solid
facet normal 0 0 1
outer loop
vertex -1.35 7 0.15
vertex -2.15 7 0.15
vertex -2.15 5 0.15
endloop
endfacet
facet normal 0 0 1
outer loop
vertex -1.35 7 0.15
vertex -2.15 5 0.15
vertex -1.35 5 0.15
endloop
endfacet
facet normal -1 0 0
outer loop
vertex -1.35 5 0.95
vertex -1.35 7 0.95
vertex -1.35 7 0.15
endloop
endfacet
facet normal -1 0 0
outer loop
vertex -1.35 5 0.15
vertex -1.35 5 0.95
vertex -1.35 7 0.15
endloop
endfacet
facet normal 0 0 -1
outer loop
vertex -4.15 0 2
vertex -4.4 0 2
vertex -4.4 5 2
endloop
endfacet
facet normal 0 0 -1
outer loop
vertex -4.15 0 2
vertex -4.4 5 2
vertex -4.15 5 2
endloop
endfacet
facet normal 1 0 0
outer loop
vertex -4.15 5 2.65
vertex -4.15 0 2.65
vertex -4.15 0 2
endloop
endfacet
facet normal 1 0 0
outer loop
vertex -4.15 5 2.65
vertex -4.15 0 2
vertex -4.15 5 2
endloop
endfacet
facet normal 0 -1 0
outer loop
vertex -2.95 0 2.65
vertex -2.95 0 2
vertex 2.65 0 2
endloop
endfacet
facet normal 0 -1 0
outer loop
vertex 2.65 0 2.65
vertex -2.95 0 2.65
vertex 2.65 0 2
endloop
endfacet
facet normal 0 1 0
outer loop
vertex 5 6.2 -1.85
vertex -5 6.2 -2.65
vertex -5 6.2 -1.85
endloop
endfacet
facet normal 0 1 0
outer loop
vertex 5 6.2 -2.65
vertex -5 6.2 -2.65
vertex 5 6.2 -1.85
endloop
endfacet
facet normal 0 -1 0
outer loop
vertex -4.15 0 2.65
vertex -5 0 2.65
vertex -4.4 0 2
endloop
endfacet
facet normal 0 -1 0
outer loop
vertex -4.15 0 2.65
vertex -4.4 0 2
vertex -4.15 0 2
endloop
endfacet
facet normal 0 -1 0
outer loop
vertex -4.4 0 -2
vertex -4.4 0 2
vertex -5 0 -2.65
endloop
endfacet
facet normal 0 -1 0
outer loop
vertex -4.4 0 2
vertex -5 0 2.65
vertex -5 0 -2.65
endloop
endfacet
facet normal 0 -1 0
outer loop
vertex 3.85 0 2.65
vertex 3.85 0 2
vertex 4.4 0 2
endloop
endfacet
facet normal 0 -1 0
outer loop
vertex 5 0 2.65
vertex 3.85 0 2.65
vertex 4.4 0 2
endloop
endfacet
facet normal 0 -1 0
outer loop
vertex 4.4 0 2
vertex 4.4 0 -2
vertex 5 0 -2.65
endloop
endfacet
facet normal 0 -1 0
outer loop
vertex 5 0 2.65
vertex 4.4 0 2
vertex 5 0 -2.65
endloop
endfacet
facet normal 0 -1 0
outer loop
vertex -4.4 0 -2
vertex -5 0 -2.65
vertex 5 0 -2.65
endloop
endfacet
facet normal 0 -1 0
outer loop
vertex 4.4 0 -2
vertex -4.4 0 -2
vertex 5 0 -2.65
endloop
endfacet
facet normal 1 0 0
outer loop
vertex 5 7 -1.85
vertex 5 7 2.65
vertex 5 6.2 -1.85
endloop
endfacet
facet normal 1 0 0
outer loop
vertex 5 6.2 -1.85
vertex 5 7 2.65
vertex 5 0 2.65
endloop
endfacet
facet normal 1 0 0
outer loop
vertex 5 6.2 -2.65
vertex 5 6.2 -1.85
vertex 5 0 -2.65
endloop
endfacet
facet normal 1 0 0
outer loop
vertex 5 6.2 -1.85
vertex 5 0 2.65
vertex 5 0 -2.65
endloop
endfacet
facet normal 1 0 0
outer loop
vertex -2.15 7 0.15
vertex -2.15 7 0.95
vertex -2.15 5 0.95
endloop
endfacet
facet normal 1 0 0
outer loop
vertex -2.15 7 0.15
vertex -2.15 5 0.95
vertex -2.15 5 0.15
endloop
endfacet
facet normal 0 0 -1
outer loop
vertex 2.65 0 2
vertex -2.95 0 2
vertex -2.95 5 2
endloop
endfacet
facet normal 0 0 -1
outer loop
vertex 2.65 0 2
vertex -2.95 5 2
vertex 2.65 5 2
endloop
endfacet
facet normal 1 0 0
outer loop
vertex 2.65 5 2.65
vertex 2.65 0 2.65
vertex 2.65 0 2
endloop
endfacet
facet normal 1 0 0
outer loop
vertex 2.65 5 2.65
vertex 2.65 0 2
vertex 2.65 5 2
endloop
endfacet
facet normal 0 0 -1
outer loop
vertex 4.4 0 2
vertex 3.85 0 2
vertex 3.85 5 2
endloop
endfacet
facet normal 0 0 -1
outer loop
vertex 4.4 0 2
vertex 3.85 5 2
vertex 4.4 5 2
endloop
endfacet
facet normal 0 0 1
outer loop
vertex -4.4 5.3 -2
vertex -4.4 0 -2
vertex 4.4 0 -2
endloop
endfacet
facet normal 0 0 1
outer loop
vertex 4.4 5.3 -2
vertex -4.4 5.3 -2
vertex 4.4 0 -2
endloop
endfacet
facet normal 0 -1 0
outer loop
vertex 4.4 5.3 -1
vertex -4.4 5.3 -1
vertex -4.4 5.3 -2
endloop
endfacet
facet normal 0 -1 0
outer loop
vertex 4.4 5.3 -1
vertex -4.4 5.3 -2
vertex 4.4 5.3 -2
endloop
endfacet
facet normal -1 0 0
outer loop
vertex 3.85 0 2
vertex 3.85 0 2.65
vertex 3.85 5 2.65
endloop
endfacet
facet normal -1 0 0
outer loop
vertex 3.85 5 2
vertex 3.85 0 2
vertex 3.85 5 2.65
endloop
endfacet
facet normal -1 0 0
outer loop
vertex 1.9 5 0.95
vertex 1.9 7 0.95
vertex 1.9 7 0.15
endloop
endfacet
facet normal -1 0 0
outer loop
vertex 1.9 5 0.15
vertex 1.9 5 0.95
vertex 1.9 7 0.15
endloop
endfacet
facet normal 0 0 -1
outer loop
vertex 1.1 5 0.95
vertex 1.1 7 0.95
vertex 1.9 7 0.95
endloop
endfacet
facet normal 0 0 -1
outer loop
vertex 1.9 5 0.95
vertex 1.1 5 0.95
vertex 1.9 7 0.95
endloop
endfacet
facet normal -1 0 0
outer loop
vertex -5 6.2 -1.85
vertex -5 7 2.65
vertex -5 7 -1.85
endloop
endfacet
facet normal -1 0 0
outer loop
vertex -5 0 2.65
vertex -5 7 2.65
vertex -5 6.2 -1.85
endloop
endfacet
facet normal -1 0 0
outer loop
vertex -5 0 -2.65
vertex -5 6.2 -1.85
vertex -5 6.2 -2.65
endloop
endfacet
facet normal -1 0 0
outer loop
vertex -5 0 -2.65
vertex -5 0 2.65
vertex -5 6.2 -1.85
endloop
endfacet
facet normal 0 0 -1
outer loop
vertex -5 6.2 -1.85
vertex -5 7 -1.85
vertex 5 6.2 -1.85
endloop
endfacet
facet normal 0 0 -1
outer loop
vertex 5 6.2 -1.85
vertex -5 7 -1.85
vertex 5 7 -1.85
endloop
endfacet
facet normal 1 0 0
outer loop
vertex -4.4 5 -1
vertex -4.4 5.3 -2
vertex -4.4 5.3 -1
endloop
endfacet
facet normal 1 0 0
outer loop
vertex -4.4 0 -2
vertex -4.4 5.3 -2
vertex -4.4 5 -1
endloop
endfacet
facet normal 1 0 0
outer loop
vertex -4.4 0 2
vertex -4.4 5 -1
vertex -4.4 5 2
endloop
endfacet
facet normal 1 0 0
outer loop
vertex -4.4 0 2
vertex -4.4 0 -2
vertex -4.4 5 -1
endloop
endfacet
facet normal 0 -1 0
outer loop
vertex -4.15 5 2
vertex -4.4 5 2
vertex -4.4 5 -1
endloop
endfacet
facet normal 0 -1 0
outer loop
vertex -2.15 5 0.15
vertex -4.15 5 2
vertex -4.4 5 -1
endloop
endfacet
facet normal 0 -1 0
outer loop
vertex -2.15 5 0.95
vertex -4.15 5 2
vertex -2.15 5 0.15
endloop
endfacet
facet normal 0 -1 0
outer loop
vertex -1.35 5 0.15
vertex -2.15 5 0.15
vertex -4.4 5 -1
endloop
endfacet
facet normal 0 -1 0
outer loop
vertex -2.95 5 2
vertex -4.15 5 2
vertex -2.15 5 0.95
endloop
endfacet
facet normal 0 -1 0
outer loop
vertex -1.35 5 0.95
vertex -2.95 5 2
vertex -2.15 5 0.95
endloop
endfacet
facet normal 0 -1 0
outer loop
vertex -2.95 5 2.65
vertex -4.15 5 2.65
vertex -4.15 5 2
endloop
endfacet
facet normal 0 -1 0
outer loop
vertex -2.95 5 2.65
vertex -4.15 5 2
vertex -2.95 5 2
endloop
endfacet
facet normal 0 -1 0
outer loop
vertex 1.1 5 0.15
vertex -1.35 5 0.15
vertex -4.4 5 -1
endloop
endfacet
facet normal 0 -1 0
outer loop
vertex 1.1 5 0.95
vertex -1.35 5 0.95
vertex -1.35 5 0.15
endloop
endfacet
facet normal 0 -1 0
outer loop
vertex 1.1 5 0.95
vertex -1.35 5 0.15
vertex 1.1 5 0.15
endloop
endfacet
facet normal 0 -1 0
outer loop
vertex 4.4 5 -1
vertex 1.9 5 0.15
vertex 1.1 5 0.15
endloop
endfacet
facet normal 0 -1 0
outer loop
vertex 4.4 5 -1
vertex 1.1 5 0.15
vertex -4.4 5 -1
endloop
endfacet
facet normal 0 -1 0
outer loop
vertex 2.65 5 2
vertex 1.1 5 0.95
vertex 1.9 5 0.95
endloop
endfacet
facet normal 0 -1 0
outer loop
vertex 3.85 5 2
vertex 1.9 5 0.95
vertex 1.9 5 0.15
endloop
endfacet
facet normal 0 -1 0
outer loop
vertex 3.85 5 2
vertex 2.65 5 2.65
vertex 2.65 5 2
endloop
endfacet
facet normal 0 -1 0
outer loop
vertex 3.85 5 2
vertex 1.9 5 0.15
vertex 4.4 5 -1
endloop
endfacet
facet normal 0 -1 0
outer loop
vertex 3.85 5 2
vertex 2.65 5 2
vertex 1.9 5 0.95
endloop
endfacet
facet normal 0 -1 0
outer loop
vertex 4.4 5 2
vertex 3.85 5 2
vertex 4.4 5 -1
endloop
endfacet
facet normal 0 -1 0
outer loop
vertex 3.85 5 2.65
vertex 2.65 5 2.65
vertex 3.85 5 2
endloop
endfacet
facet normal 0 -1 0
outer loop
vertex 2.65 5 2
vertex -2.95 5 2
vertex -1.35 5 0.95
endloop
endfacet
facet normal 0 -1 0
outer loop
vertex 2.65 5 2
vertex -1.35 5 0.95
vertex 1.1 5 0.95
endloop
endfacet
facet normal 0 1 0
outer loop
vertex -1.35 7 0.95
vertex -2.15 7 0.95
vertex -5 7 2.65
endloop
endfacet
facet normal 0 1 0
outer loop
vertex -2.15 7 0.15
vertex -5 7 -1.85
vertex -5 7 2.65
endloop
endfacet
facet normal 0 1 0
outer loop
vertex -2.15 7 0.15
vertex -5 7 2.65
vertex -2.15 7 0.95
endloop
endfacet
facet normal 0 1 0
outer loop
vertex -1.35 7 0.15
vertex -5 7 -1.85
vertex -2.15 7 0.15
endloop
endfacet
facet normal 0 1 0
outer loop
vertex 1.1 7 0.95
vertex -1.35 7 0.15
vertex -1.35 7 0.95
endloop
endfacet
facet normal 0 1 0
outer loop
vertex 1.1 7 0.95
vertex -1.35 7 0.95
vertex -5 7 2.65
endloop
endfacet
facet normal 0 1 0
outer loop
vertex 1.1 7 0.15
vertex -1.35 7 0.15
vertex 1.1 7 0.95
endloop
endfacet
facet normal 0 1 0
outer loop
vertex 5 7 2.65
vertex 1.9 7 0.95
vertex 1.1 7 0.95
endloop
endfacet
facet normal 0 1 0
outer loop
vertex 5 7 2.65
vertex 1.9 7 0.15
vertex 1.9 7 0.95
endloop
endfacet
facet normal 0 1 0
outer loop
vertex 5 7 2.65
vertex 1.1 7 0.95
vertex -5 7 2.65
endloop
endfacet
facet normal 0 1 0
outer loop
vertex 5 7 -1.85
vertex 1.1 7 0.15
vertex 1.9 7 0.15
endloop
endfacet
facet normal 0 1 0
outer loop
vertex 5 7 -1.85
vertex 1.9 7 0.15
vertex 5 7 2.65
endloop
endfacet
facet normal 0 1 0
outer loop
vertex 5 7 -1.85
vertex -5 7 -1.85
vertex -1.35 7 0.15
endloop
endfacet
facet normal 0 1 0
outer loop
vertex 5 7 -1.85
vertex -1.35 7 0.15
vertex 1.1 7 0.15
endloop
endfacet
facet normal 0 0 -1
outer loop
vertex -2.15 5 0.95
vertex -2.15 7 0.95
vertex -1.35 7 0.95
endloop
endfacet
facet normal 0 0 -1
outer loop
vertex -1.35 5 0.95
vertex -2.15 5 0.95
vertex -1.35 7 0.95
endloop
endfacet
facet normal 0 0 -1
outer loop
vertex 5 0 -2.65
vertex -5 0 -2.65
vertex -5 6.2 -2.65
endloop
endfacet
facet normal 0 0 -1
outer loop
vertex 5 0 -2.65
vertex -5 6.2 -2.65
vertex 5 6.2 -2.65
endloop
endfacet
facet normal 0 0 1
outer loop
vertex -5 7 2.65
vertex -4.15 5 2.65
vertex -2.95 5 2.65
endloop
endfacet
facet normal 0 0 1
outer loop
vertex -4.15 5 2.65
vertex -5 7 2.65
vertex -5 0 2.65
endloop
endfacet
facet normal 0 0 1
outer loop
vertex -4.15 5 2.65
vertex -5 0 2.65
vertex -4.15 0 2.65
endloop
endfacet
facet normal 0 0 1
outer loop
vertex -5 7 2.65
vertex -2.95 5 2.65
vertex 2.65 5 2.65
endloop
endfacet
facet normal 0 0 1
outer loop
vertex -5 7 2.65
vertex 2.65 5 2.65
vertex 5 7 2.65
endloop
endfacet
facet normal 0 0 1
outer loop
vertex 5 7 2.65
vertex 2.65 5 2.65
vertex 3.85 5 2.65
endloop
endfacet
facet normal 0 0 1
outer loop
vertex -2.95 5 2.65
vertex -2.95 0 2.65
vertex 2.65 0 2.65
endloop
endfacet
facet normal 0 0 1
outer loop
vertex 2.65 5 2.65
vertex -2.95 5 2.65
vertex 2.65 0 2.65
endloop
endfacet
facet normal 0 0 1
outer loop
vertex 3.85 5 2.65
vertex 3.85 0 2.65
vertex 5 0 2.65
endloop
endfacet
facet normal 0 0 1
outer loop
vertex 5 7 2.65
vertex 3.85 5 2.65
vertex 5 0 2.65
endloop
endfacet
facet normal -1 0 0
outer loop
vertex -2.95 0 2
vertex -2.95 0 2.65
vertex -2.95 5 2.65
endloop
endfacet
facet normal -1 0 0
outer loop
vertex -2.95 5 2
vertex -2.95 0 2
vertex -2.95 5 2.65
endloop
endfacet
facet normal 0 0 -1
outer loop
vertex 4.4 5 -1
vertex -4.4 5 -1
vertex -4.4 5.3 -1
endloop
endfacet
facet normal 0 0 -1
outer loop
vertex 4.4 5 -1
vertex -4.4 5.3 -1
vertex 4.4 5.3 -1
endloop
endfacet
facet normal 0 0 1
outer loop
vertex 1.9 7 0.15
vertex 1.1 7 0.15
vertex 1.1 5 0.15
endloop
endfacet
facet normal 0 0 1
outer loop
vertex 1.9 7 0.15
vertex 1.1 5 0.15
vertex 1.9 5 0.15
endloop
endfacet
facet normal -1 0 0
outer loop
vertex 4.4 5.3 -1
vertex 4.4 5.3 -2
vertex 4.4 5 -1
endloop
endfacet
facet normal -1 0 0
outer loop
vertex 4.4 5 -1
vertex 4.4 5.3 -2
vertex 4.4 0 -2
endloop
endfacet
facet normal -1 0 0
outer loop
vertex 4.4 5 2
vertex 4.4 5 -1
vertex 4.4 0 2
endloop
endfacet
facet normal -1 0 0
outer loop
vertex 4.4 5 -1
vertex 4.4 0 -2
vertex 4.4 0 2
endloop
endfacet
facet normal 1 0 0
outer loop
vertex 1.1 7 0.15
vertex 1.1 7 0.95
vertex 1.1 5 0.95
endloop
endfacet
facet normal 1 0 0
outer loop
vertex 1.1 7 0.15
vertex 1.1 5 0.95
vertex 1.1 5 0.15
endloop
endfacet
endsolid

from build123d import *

# Parameters (mm, degrees)
SKETCH1_W           = 10
SKETCH1_H           = 5.3
BOSS_EXTRUDE1_DEPTH = 7
SKETCH3_W           = 8.8
SKETCH3_H           = 4
CUT_EXTRUDE1_DEPTH  = 5
SKETCH4_W           = 1.2
SKETCH4_H           = 5
CUT_EXTRUDE2_DEPTH  = 4
SKETCH5_W           = 10
SKETCH5_H           = 0.8
CUT_EXTRUDE3_DEPTH  = 0.8
SKETCH6_W           = 0.8
SKETCH6_H           = 0.8
CUT_EXTRUDE4_DEPTH  = 10
SKETCH7_W           = 8.8
SKETCH7_H           = 1
CUT_EXTRUDE5_DEPTH  = 0.3


with BuildPart() as part:
    # Sketch1 → Boss-Extrude1 (new body)
    with BuildSketch(Plane(origin=(0, 0, 0), x_dir=(1, 0, 0), z_dir=(0, 1, 0))):
        Rectangle(SKETCH1_W, SKETCH1_H)
    extrude(amount=BOSS_EXTRUDE1_DEPTH)

    # Sketch3 → Cut-Extrude1 (cut)
    with BuildSketch(Plane.XZ):
        Rectangle(SKETCH3_W, SKETCH3_H)
    extrude(amount=-CUT_EXTRUDE1_DEPTH, mode=Mode.SUBTRACT)

    # Sketch4 → Cut-Extrude2 (cut)
    with BuildSketch(Plane.XY.offset(2.65)):
        with Locations((-3.55, 2.5)):
            Rectangle(SKETCH4_W, SKETCH4_H)
        with Locations((3.25, 2.5)):
            Rectangle(SKETCH4_W, SKETCH4_H)
    extrude(amount=-CUT_EXTRUDE2_DEPTH, mode=Mode.SUBTRACT)

    # Sketch5 → Cut-Extrude3 (cut)
    with BuildSketch(Plane(origin=(0, 7, 0), x_dir=(1, 0, 0), z_dir=(0, 1, 0))):
        with Locations((0, 2.25)):
            Rectangle(SKETCH5_W, SKETCH5_H)
    extrude(amount=-CUT_EXTRUDE3_DEPTH, mode=Mode.SUBTRACT)

    # Sketch6 → Cut-Extrude4 (cut)
    with BuildSketch(Plane(origin=(0, 7, 0), x_dir=(1, 0, 0), z_dir=(0, 1, 0))):
        with Locations((1.5, -0.55)):
            Rectangle(SKETCH6_W, SKETCH6_H)
        with Locations((-1.75, -0.55)):
            Rectangle(SKETCH6_W, SKETCH6_H)
    extrude(amount=-CUT_EXTRUDE4_DEPTH, mode=Mode.SUBTRACT)

    # Sketch7 → Cut-Extrude5 (cut)
    with BuildSketch(Plane.XZ.offset(-5)):
        with Locations((0, -1.5)):
            Rectangle(SKETCH7_W, SKETCH7_H)
    extrude(amount=-CUT_EXTRUDE5_DEPTH, mode=Mode.SUBTRACT)


solid = part.part
